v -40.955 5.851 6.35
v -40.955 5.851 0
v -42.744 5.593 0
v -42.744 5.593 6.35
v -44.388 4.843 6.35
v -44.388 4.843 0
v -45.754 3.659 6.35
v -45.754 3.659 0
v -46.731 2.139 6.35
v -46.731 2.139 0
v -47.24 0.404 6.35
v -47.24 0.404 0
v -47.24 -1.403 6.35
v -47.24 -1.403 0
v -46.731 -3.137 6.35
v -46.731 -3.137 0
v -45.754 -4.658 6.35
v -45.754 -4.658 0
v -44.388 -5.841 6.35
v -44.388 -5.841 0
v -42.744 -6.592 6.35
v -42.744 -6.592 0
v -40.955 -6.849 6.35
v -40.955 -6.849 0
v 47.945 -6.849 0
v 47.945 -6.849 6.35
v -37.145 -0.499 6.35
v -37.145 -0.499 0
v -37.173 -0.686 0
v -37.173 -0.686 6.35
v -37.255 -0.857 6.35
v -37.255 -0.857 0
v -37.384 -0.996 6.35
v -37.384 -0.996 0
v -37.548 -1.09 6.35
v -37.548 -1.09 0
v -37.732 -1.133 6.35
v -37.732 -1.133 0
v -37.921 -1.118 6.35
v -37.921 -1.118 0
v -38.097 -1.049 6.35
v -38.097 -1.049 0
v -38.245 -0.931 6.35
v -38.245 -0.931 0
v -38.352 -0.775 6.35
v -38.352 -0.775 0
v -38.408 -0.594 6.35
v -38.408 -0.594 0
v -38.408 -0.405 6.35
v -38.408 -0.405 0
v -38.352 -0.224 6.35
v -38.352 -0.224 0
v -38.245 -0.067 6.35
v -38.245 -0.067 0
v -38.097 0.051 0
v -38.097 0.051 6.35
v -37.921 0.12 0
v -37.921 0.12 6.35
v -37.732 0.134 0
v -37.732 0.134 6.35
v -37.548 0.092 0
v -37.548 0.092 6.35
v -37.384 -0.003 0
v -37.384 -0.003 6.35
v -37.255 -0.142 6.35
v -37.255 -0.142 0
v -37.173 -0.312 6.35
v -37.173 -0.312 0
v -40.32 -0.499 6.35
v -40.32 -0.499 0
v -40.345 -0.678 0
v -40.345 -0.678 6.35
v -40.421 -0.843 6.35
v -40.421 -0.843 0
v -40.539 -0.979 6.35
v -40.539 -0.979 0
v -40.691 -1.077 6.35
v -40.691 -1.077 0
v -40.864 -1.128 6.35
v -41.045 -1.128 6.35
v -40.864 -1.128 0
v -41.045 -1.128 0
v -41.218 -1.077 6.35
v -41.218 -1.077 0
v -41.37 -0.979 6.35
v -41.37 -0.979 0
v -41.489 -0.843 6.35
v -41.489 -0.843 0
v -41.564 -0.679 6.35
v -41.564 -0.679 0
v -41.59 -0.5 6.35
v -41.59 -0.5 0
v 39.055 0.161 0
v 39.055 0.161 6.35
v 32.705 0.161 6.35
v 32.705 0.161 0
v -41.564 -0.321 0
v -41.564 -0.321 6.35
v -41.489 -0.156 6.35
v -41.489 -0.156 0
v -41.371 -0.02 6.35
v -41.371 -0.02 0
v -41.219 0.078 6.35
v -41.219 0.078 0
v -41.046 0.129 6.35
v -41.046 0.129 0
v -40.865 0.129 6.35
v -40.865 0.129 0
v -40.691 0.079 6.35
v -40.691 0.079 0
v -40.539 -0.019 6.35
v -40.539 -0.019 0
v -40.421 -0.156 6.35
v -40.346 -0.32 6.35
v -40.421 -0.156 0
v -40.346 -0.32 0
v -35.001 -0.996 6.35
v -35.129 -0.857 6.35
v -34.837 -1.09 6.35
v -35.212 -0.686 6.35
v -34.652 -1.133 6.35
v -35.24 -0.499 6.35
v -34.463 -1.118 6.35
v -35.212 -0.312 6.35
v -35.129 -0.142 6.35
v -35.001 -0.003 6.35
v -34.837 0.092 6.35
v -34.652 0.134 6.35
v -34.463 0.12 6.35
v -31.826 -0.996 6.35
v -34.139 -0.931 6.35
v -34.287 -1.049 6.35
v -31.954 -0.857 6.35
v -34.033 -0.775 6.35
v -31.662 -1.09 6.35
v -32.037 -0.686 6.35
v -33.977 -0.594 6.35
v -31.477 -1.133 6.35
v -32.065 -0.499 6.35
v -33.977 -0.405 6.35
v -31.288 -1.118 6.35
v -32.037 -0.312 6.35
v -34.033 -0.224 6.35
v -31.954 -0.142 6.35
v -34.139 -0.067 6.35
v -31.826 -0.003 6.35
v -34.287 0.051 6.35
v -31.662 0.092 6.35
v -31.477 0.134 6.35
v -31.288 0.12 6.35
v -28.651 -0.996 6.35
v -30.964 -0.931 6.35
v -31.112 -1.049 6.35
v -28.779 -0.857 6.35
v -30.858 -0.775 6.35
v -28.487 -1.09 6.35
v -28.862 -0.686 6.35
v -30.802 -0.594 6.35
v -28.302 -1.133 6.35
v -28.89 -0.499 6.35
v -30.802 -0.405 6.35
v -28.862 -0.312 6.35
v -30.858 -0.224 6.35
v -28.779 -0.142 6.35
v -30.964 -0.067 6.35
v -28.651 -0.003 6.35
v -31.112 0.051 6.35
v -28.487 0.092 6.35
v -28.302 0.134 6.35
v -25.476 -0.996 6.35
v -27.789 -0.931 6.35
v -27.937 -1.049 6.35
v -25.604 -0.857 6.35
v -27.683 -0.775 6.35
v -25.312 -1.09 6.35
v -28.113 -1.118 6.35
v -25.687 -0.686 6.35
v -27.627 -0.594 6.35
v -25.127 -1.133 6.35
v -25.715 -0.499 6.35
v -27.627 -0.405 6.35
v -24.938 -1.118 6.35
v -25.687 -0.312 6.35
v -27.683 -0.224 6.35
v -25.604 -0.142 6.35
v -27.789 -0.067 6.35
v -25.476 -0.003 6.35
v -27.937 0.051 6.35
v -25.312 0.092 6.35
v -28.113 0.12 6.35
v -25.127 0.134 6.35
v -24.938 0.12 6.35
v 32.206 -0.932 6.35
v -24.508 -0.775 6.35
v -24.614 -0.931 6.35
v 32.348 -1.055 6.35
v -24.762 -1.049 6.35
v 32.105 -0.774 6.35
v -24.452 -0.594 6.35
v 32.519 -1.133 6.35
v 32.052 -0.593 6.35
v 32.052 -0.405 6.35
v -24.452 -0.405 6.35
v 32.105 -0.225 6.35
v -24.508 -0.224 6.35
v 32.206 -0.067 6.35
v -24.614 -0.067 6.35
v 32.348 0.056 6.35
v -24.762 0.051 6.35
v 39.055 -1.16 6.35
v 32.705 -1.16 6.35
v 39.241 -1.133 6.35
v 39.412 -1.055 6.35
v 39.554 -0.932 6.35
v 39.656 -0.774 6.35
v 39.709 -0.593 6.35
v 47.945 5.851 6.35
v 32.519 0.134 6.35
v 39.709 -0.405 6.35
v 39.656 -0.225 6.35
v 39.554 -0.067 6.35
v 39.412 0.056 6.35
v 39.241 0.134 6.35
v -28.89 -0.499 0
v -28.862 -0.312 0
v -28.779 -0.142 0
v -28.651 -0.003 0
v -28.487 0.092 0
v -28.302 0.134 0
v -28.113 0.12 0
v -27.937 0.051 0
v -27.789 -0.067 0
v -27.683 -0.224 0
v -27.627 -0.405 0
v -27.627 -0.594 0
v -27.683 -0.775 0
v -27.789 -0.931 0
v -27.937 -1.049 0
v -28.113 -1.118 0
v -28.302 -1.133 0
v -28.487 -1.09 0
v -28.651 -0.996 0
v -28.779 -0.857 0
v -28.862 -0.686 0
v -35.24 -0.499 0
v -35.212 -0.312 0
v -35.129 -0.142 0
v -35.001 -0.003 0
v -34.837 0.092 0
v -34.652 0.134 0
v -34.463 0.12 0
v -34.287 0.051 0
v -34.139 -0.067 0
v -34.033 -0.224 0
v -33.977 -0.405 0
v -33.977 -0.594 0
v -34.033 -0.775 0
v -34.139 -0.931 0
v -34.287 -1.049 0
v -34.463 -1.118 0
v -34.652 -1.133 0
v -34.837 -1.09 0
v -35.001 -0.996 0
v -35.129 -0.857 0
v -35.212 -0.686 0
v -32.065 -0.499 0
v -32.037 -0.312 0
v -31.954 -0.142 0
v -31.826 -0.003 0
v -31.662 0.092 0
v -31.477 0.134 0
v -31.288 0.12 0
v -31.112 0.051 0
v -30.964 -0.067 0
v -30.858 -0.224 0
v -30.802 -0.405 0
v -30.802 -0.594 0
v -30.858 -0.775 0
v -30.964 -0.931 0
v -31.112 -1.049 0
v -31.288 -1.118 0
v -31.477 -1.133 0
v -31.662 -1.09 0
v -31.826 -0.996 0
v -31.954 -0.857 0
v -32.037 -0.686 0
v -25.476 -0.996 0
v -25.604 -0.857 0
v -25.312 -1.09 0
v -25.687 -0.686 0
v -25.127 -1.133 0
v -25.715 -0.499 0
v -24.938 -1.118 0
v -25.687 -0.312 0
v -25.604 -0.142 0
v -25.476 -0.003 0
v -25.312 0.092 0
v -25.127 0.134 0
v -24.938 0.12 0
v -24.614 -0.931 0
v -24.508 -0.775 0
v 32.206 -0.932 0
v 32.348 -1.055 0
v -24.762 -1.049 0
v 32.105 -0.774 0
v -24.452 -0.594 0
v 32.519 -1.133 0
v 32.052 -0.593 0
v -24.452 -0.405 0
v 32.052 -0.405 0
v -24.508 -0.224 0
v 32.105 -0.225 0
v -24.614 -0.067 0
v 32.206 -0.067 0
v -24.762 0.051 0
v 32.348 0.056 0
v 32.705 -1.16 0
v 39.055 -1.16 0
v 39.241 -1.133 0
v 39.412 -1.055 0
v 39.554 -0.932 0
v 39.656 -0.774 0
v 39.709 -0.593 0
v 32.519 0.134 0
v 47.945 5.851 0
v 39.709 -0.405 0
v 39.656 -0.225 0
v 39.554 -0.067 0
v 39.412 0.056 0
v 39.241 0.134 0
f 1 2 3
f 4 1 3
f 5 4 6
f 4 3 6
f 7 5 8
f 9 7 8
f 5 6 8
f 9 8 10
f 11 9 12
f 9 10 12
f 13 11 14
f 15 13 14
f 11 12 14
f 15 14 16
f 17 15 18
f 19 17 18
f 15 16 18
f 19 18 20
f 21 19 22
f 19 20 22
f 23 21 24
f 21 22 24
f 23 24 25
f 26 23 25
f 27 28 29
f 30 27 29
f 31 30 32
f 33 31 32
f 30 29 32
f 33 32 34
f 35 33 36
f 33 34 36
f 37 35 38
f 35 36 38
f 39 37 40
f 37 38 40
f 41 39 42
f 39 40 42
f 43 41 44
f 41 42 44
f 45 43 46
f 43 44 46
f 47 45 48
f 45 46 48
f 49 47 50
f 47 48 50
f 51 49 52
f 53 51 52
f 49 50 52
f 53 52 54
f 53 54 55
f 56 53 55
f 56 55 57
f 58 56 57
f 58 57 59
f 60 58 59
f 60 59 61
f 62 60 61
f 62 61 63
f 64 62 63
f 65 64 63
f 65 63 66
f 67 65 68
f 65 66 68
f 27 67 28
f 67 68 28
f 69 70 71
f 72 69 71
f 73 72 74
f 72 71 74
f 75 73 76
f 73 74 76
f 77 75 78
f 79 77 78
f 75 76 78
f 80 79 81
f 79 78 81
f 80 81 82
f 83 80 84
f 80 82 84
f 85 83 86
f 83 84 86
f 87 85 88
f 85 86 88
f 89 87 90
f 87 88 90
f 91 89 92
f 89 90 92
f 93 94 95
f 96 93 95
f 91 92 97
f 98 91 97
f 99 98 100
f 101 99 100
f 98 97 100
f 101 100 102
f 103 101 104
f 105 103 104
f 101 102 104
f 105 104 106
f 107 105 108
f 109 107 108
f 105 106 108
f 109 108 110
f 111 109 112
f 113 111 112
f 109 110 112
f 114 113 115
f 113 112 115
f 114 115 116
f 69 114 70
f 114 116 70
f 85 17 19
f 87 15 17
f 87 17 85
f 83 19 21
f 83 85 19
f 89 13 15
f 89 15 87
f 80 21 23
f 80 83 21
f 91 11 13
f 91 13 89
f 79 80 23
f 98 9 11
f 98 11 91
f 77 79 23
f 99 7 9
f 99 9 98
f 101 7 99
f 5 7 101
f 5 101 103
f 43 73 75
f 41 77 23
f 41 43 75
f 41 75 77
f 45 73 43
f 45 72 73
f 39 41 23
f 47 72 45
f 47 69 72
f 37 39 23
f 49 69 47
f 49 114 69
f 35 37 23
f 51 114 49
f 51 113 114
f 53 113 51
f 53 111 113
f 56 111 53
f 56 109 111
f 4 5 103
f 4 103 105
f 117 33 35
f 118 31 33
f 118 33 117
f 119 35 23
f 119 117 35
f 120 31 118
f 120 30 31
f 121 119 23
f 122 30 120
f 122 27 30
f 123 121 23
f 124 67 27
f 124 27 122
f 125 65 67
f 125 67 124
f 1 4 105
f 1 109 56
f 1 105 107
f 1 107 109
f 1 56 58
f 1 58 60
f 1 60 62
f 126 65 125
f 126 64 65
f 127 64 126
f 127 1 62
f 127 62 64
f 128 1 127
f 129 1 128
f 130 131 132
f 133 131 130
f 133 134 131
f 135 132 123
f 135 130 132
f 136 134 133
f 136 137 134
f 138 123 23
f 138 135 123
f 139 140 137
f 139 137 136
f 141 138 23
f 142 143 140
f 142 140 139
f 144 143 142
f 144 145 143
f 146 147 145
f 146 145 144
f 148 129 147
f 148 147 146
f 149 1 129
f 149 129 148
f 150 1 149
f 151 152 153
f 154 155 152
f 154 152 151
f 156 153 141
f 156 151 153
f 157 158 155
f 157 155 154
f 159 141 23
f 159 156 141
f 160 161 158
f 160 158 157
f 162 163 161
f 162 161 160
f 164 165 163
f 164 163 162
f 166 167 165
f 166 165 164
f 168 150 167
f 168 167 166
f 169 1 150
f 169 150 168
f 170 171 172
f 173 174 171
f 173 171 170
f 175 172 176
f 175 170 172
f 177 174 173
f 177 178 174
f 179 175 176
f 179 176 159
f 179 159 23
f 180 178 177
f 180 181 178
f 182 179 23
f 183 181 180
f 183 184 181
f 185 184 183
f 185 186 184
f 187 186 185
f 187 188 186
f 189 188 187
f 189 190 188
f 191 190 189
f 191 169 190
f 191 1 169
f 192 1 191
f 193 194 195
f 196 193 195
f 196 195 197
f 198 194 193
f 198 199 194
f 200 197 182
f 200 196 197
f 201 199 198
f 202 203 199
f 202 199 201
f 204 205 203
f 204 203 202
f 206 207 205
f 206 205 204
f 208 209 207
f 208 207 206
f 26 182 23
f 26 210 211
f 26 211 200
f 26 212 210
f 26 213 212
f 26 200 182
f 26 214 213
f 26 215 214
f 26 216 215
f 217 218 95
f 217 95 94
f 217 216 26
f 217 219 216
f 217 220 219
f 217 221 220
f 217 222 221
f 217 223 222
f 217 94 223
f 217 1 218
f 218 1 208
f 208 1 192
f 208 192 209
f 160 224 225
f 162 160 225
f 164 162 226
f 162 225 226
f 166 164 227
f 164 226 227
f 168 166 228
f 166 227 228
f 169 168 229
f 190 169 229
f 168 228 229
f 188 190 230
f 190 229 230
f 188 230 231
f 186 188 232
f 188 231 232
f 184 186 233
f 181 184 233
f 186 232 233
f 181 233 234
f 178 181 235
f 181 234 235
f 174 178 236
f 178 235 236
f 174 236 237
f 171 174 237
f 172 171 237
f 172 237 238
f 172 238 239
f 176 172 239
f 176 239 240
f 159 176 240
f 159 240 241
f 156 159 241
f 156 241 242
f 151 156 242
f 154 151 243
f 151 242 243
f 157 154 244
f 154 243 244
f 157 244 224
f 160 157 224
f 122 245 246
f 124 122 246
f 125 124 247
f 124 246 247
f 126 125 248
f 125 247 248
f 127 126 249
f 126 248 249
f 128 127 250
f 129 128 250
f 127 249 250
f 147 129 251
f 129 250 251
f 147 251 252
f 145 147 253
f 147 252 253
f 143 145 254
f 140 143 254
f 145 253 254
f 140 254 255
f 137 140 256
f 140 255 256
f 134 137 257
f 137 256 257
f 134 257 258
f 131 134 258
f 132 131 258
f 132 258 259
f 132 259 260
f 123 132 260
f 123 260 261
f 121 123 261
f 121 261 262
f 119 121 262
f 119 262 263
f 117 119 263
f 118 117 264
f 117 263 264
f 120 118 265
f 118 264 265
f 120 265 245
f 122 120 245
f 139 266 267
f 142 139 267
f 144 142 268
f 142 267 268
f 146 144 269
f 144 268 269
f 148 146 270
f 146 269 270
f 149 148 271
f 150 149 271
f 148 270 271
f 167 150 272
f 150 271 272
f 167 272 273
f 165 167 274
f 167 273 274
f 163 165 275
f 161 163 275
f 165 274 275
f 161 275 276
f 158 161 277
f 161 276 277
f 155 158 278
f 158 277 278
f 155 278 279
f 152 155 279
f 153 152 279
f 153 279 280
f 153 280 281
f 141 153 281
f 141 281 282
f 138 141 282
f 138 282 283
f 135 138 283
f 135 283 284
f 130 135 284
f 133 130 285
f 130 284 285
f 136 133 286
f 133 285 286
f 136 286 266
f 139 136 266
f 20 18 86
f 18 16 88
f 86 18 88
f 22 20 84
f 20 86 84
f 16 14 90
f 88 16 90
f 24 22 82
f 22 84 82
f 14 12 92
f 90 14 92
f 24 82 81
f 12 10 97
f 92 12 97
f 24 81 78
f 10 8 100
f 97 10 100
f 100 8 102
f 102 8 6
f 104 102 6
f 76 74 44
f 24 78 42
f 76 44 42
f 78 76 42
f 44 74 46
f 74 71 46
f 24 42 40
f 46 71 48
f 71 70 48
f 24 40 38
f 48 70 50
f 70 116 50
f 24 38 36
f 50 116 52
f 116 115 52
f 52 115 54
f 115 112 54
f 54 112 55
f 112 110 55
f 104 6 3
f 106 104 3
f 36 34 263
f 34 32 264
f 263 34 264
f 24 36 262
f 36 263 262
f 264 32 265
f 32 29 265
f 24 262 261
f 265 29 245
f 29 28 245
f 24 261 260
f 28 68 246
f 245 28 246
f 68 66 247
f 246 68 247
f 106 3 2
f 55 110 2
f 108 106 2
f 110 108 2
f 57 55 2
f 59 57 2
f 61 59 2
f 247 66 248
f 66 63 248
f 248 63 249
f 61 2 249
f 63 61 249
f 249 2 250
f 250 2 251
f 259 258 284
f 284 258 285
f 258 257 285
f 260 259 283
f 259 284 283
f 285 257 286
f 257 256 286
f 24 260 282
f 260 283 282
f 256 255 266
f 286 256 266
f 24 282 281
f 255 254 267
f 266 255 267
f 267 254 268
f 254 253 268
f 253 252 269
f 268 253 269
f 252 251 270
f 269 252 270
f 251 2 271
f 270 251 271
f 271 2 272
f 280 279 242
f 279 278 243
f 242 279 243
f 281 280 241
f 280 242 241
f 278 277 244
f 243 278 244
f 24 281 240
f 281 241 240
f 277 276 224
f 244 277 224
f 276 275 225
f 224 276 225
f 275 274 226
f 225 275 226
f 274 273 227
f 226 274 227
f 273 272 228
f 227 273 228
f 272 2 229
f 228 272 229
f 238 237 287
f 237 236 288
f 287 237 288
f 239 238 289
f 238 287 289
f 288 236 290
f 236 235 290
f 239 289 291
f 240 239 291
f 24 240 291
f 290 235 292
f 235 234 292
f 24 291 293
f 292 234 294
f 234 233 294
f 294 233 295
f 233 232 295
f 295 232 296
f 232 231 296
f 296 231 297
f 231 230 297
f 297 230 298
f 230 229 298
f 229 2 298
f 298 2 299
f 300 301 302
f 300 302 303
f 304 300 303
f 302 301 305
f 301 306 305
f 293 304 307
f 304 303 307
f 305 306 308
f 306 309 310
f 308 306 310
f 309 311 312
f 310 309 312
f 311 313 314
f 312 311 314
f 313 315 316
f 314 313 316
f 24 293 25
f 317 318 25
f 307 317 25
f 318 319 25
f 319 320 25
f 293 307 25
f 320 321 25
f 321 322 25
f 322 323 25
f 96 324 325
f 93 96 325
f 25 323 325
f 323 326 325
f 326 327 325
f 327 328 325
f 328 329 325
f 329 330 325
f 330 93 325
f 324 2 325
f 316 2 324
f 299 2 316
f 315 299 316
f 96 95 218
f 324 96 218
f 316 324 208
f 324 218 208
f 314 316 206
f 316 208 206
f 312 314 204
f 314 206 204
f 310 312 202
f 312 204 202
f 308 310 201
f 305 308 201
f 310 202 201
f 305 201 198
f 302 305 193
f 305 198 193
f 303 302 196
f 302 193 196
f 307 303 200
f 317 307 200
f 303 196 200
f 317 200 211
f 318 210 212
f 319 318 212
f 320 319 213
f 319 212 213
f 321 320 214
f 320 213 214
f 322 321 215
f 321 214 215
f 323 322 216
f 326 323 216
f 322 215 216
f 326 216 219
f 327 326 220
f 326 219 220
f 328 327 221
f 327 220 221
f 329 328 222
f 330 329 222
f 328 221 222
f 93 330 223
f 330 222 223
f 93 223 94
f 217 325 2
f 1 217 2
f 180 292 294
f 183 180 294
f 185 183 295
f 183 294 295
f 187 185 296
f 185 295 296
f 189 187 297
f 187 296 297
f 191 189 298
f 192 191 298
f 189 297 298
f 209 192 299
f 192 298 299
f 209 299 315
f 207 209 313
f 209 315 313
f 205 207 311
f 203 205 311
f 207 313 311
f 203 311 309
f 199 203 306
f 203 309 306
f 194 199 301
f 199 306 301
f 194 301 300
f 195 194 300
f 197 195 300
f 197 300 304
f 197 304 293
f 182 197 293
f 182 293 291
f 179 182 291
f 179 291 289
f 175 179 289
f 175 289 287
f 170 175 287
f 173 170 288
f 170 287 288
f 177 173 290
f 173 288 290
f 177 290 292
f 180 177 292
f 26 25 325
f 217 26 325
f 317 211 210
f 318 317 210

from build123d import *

# Parameters (mm, degrees)
BOSS_EXTRUDE3_DEPTH = 6.35
CUT_EXTRUDE2_DEPTH  = 25.4


with BuildPart() as part:
    # Sketch1 → Boss-Extrude3 (new body)
    # profile 1 of 2: a face of its own
    with BuildSketch(Plane.XY):
        with BuildLine():
            ThreePointArc((-40.954752736, 5.850678962), (-47.304752736, -0.499321038), (-40.954752736, -6.849321038))
            Line((-40.954752736, -6.849321038), (47.945247264, -6.849321038))
            Line((47.945247264, -6.849321038), (47.945247264, 5.850678962))
            Line((47.945247264, 5.850678962), (-40.954752736, 5.850678962))
        make_face()
        with BuildLine():
            ThreePointArc((-40.319752736, -0.499321038), (-40.954490658, -1.134320984), (-41.589752519, -0.499845193))
            ThreePointArc((-41.589752519, -0.499845193), (-40.955276891, 0.135678746), (-40.319752952, -0.498796882))
            ThreePointArc((-40.319752952, -0.498796882), (-40.31975279, -0.49905896), (-40.319752736, -0.499321038))
        make_face(mode=Mode.SUBTRACT)
        with BuildLine():
            Line((-37.144752749, -0.499189999), (-37.144752736, -0.499321038))
            ThreePointArc((-37.144752736, -0.499321038), (-38.414752732, -0.499386557), (-37.144752749, -0.499189999))
        make_face(mode=Mode.SUBTRACT)
        with BuildLine():
            ThreePointArc((-33.969752736, -0.499321038), (-34.604752736, -1.134321038), (-35.239752736, -0.499321038))
            ThreePointArc((-35.239752736, -0.499321038), (-34.604752736, 0.135678962), (-33.969752736, -0.499321038))
        make_face(mode=Mode.SUBTRACT)
        with BuildLine():
            ThreePointArc((-30.794752736, -0.499321038), (-31.429752736, -1.134321038), (-32.064752736, -0.499321038))
            ThreePointArc((-32.064752736, -0.499321038), (-31.429752736, 0.135678962), (-30.794752736, -0.499321038))
        make_face(mode=Mode.SUBTRACT)
        with BuildLine():
            ThreePointArc((-27.619752736, -0.499321038), (-28.254752736, -1.134321038), (-28.889752736, -0.499321038))
            ThreePointArc((-28.889752736, -0.499321038), (-28.254752736, 0.135678962), (-27.619752736, -0.499321038))
        make_face(mode=Mode.SUBTRACT)
        with BuildLine():
            ThreePointArc((-24.444752736, -0.499321038), (-25.079752736, -1.134321038), (-25.714752736, -0.499321038))
            ThreePointArc((-25.714752736, -0.499321038), (-25.079752736, 0.135678962), (-24.444752736, -0.499321038))
        make_face(mode=Mode.SUBTRACT)
        with BuildLine():
            ThreePointArc((32.070247264, -0.499321038), (32.705247264, 0.135678962), (33.340247264, -0.499321038))
            ThreePointArc((33.340247264, -0.499321038), (32.705247264, -1.134321038), (32.070247264, -0.499321038))
        make_face(mode=Mode.SUBTRACT)
        with BuildLine():
            ThreePointArc((35.245247264, -0.499321038), (35.880247264, 0.135678962), (36.515247264, -0.499321038))
            ThreePointArc((36.515247264, -0.499321038), (35.880247264, -1.134321038), (35.245247264, -0.499321038))
        make_face(mode=Mode.SUBTRACT)
        with BuildLine():
            ThreePointArc((38.420247264, -0.499321038), (39.055247264, 0.135678962), (39.690247264, -0.499321038))
            ThreePointArc((39.690247264, -0.499321038), (39.055247264, -1.134321038), (38.420247264, -0.499321038))
        make_face(mode=Mode.SUBTRACT)
    # profile 2 of 2: a face of its own
    with BuildSketch(Plane.XY):
        with BuildLine():
            ThreePointArc((-40.954752736, 5.850678962), (-47.304752736, -0.499321038), (-40.954752736, -6.849321038))
            Line((-40.954752736, -6.849321038), (47.945247264, -6.849321038))
            Line((47.945247264, -6.849321038), (47.945247264, 5.850678962))
            Line((47.945247264, 5.850678962), (-40.954752736, 5.850678962))
        make_face()
        with BuildLine():
            ThreePointArc((-40.319752736, -0.499321038), (-40.954490658, -1.134320984), (-41.589752519, -0.499845193))
            ThreePointArc((-41.589752519, -0.499845193), (-40.955276891, 0.135678746), (-40.319752952, -0.498796882))
            ThreePointArc((-40.319752952, -0.498796882), (-40.31975279, -0.49905896), (-40.319752736, -0.499321038))
        make_face(mode=Mode.SUBTRACT)
        with BuildLine():
            Line((-37.144752749, -0.499189999), (-37.144752736, -0.499321038))
            ThreePointArc((-37.144752736, -0.499321038), (-38.414752732, -0.499386557), (-37.144752749, -0.499189999))
        make_face(mode=Mode.SUBTRACT)
        with BuildLine():
            ThreePointArc((-33.969752736, -0.499321038), (-34.604752736, -1.134321038), (-35.239752736, -0.499321038))
            ThreePointArc((-35.239752736, -0.499321038), (-34.604752736, 0.135678962), (-33.969752736, -0.499321038))
        make_face(mode=Mode.SUBTRACT)
        with BuildLine():
            ThreePointArc((-30.794752736, -0.499321038), (-31.429752736, -1.134321038), (-32.064752736, -0.499321038))
            ThreePointArc((-32.064752736, -0.499321038), (-31.429752736, 0.135678962), (-30.794752736, -0.499321038))
        make_face(mode=Mode.SUBTRACT)
        with BuildLine():
            ThreePointArc((-27.619752736, -0.499321038), (-28.254752736, -1.134321038), (-28.889752736, -0.499321038))
            ThreePointArc((-28.889752736, -0.499321038), (-28.254752736, 0.135678962), (-27.619752736, -0.499321038))
        make_face(mode=Mode.SUBTRACT)
        with BuildLine():
            ThreePointArc((-24.444752736, -0.499321038), (-25.079752736, -1.134321038), (-25.714752736, -0.499321038))
            ThreePointArc((-25.714752736, -0.499321038), (-25.079752736, 0.135678962), (-24.444752736, -0.499321038))
        make_face(mode=Mode.SUBTRACT)
        with BuildLine():
            ThreePointArc((32.070247264, -0.499321038), (32.705247264, 0.135678962), (33.340247264, -0.499321038))
            ThreePointArc((33.340247264, -0.499321038), (32.705247264, -1.134321038), (32.070247264, -0.499321038))
        make_face(mode=Mode.SUBTRACT)
        with BuildLine():
            ThreePointArc((35.245247264, -0.499321038), (35.880247264, 0.135678962), (36.515247264, -0.499321038))
            ThreePointArc((36.515247264, -0.499321038), (35.880247264, -1.134321038), (35.245247264, -0.499321038))
        make_face(mode=Mode.SUBTRACT)
        with BuildLine():
            ThreePointArc((38.420247264, -0.499321038), (39.055247264, 0.135678962), (39.690247264, -0.499321038))
            ThreePointArc((39.690247264, -0.499321038), (39.055247264, -1.134321038), (38.420247264, -0.499321038))
        make_face(mode=Mode.SUBTRACT)
    extrude(amount=BOSS_EXTRUDE3_DEPTH)

    # Sketch2 → Cut-Extrude2 (cut)
    with BuildSketch(Plane.XY.offset(6.35)):
        with BuildLine():
            Line((32.705247264, -1.159721038), (39.055247264, -1.159721038))
            ThreePointArc((39.055247264, -1.159721038), (39.715647264, -0.499321038), (39.055247264, 0.161078962))
            Line((39.055247264, 0.161078962), (32.705247264, 0.161078962))
            ThreePointArc((32.705247264, 0.161078962), (32.044847264, -0.499321038), (32.705247264, -1.159721038))
        make_face()
    extrude(amount=-CUT_EXTRUDE2_DEPTH, mode=Mode.SUBTRACT)


solid = part.part
